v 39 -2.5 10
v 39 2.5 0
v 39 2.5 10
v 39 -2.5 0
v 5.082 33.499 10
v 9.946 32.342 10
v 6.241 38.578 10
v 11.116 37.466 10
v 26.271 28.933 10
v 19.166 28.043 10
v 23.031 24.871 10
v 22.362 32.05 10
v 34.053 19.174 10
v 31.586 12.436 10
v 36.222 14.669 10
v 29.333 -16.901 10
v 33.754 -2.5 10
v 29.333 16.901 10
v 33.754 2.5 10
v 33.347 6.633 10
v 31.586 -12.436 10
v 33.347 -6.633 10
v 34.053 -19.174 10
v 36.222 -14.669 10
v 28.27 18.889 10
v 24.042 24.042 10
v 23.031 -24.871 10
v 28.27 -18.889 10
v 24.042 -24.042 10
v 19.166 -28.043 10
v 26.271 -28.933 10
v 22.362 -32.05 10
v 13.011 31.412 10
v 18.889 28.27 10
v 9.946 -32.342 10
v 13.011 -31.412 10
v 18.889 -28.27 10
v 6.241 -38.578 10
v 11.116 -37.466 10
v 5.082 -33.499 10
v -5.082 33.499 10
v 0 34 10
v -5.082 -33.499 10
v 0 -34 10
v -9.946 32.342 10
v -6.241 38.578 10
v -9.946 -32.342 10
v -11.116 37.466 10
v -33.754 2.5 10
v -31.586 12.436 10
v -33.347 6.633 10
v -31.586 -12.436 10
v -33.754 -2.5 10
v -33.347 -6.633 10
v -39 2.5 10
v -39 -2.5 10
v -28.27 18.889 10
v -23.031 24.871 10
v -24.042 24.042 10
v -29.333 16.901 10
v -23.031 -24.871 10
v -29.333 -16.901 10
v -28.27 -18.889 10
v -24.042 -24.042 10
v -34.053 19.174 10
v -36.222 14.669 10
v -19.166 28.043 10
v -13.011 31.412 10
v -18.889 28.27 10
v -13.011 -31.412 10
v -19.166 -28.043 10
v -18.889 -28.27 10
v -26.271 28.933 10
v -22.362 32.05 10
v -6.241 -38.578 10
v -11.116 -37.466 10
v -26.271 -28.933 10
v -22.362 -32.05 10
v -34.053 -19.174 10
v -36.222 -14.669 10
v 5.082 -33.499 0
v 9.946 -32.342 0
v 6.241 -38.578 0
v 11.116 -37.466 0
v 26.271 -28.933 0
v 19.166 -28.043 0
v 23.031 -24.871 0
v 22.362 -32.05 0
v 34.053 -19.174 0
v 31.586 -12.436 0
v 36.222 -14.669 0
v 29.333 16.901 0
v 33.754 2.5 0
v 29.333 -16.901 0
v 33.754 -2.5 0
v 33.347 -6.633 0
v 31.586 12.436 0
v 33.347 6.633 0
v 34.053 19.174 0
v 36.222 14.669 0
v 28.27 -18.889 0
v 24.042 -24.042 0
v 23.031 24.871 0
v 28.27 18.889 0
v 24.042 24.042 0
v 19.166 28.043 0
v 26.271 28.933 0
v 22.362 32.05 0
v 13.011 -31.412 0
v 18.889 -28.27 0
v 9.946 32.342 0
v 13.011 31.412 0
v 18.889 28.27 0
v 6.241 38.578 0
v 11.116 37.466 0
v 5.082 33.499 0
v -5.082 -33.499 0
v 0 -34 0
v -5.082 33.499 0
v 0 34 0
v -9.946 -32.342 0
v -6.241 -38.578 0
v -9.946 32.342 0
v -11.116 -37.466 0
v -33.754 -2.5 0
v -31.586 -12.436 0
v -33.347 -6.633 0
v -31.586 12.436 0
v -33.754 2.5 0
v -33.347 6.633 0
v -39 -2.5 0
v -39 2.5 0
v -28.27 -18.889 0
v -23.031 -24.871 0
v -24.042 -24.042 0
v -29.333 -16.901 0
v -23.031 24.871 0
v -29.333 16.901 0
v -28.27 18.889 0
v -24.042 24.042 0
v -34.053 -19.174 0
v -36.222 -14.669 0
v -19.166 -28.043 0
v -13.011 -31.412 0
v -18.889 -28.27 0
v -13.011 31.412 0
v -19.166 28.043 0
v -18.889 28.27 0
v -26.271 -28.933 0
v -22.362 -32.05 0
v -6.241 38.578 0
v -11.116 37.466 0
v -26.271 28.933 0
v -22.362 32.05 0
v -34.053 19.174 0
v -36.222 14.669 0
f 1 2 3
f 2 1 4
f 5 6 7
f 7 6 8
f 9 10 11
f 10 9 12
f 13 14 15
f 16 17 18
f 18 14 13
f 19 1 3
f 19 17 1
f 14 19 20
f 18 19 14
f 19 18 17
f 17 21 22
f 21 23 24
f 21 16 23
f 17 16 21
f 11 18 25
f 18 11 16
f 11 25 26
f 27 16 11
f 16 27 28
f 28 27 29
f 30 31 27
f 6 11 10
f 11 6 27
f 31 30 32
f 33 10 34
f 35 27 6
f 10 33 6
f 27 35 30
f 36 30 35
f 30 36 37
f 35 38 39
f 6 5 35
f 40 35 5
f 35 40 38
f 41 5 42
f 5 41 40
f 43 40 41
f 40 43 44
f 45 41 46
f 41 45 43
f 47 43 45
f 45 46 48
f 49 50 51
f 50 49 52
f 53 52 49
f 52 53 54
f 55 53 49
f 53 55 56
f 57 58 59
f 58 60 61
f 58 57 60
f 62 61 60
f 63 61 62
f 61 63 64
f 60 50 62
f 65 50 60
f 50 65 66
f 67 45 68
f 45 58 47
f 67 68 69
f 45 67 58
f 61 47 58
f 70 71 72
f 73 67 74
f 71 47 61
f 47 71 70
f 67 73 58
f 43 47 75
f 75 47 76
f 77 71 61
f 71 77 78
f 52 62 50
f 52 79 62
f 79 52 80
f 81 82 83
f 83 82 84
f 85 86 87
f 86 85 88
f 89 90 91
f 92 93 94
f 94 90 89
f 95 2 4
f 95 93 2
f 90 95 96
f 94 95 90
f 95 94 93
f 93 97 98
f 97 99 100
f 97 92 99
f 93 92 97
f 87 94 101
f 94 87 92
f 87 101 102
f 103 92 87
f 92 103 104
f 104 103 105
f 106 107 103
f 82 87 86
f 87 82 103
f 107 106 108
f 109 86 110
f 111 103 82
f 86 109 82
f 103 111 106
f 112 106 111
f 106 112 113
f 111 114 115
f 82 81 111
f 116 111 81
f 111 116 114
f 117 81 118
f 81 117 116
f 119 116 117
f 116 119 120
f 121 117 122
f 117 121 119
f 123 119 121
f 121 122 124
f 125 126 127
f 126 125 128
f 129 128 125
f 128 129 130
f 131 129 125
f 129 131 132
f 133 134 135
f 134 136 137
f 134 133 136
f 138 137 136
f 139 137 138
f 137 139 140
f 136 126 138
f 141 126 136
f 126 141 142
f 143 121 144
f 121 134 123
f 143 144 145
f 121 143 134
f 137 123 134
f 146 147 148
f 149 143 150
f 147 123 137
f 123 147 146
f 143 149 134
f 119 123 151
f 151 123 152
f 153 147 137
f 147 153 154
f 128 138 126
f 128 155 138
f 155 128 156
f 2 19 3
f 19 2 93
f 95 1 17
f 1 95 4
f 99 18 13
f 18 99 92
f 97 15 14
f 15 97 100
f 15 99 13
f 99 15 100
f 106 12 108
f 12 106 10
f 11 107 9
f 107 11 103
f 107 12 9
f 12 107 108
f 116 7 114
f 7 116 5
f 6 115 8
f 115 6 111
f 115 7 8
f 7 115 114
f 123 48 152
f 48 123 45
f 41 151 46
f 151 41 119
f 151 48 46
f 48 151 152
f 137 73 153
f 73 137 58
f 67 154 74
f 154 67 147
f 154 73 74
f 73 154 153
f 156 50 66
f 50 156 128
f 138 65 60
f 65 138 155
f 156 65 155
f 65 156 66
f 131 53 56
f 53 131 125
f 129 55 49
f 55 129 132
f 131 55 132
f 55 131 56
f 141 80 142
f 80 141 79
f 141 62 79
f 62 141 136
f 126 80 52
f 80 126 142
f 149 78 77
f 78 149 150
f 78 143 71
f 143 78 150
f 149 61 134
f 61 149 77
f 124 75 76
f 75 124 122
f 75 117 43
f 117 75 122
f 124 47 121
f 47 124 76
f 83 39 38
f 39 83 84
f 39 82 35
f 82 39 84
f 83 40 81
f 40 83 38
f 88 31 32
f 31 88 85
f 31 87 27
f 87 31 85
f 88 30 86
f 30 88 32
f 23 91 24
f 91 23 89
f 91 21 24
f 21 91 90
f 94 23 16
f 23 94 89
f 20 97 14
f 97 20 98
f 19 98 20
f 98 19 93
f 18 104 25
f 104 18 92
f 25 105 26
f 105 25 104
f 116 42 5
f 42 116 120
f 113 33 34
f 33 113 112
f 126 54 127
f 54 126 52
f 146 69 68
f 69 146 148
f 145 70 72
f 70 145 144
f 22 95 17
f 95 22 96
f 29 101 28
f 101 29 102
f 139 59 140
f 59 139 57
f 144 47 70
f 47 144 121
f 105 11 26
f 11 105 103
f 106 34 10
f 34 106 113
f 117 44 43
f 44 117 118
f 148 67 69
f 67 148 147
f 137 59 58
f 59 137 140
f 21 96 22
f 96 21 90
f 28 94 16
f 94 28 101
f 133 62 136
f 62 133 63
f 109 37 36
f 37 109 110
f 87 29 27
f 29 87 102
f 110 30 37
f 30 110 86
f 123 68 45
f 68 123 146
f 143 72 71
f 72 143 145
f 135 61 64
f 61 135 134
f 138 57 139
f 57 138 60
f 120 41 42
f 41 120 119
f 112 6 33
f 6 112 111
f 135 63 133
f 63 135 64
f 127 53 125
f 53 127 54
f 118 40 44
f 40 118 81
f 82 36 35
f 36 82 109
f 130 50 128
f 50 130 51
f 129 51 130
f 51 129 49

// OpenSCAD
$fn = 32;

// ----------------------------------------------------------------------
// Spur blank: plain gear blank
// ----------------------------------------------------------------------

// --- parameters (mm) ---
disc_r = 34;              // blank root radius
disc_t = 10;              // blank thickness
n_teeth = 14;             // stub tooth count
tooth_w = 5;              // tooth width at the root
tooth_h = 5;              // tooth height above the root

out_r = disc_r + tooth_h;  // tip radius
bbox_x = 78.0;  // measured width over the teeth
bbox_y = 77.16;  // measured depth over the teeth

union() {
  cylinder(r = disc_r, h = disc_t);
  for (i = [0 : n_teeth - 1])
    rotate([0, 0, i * 360 / n_teeth])
      translate([disc_r - 1, -tooth_w / 2, 0])
        cube([tooth_h + 1, tooth_w, disc_t]);
}
